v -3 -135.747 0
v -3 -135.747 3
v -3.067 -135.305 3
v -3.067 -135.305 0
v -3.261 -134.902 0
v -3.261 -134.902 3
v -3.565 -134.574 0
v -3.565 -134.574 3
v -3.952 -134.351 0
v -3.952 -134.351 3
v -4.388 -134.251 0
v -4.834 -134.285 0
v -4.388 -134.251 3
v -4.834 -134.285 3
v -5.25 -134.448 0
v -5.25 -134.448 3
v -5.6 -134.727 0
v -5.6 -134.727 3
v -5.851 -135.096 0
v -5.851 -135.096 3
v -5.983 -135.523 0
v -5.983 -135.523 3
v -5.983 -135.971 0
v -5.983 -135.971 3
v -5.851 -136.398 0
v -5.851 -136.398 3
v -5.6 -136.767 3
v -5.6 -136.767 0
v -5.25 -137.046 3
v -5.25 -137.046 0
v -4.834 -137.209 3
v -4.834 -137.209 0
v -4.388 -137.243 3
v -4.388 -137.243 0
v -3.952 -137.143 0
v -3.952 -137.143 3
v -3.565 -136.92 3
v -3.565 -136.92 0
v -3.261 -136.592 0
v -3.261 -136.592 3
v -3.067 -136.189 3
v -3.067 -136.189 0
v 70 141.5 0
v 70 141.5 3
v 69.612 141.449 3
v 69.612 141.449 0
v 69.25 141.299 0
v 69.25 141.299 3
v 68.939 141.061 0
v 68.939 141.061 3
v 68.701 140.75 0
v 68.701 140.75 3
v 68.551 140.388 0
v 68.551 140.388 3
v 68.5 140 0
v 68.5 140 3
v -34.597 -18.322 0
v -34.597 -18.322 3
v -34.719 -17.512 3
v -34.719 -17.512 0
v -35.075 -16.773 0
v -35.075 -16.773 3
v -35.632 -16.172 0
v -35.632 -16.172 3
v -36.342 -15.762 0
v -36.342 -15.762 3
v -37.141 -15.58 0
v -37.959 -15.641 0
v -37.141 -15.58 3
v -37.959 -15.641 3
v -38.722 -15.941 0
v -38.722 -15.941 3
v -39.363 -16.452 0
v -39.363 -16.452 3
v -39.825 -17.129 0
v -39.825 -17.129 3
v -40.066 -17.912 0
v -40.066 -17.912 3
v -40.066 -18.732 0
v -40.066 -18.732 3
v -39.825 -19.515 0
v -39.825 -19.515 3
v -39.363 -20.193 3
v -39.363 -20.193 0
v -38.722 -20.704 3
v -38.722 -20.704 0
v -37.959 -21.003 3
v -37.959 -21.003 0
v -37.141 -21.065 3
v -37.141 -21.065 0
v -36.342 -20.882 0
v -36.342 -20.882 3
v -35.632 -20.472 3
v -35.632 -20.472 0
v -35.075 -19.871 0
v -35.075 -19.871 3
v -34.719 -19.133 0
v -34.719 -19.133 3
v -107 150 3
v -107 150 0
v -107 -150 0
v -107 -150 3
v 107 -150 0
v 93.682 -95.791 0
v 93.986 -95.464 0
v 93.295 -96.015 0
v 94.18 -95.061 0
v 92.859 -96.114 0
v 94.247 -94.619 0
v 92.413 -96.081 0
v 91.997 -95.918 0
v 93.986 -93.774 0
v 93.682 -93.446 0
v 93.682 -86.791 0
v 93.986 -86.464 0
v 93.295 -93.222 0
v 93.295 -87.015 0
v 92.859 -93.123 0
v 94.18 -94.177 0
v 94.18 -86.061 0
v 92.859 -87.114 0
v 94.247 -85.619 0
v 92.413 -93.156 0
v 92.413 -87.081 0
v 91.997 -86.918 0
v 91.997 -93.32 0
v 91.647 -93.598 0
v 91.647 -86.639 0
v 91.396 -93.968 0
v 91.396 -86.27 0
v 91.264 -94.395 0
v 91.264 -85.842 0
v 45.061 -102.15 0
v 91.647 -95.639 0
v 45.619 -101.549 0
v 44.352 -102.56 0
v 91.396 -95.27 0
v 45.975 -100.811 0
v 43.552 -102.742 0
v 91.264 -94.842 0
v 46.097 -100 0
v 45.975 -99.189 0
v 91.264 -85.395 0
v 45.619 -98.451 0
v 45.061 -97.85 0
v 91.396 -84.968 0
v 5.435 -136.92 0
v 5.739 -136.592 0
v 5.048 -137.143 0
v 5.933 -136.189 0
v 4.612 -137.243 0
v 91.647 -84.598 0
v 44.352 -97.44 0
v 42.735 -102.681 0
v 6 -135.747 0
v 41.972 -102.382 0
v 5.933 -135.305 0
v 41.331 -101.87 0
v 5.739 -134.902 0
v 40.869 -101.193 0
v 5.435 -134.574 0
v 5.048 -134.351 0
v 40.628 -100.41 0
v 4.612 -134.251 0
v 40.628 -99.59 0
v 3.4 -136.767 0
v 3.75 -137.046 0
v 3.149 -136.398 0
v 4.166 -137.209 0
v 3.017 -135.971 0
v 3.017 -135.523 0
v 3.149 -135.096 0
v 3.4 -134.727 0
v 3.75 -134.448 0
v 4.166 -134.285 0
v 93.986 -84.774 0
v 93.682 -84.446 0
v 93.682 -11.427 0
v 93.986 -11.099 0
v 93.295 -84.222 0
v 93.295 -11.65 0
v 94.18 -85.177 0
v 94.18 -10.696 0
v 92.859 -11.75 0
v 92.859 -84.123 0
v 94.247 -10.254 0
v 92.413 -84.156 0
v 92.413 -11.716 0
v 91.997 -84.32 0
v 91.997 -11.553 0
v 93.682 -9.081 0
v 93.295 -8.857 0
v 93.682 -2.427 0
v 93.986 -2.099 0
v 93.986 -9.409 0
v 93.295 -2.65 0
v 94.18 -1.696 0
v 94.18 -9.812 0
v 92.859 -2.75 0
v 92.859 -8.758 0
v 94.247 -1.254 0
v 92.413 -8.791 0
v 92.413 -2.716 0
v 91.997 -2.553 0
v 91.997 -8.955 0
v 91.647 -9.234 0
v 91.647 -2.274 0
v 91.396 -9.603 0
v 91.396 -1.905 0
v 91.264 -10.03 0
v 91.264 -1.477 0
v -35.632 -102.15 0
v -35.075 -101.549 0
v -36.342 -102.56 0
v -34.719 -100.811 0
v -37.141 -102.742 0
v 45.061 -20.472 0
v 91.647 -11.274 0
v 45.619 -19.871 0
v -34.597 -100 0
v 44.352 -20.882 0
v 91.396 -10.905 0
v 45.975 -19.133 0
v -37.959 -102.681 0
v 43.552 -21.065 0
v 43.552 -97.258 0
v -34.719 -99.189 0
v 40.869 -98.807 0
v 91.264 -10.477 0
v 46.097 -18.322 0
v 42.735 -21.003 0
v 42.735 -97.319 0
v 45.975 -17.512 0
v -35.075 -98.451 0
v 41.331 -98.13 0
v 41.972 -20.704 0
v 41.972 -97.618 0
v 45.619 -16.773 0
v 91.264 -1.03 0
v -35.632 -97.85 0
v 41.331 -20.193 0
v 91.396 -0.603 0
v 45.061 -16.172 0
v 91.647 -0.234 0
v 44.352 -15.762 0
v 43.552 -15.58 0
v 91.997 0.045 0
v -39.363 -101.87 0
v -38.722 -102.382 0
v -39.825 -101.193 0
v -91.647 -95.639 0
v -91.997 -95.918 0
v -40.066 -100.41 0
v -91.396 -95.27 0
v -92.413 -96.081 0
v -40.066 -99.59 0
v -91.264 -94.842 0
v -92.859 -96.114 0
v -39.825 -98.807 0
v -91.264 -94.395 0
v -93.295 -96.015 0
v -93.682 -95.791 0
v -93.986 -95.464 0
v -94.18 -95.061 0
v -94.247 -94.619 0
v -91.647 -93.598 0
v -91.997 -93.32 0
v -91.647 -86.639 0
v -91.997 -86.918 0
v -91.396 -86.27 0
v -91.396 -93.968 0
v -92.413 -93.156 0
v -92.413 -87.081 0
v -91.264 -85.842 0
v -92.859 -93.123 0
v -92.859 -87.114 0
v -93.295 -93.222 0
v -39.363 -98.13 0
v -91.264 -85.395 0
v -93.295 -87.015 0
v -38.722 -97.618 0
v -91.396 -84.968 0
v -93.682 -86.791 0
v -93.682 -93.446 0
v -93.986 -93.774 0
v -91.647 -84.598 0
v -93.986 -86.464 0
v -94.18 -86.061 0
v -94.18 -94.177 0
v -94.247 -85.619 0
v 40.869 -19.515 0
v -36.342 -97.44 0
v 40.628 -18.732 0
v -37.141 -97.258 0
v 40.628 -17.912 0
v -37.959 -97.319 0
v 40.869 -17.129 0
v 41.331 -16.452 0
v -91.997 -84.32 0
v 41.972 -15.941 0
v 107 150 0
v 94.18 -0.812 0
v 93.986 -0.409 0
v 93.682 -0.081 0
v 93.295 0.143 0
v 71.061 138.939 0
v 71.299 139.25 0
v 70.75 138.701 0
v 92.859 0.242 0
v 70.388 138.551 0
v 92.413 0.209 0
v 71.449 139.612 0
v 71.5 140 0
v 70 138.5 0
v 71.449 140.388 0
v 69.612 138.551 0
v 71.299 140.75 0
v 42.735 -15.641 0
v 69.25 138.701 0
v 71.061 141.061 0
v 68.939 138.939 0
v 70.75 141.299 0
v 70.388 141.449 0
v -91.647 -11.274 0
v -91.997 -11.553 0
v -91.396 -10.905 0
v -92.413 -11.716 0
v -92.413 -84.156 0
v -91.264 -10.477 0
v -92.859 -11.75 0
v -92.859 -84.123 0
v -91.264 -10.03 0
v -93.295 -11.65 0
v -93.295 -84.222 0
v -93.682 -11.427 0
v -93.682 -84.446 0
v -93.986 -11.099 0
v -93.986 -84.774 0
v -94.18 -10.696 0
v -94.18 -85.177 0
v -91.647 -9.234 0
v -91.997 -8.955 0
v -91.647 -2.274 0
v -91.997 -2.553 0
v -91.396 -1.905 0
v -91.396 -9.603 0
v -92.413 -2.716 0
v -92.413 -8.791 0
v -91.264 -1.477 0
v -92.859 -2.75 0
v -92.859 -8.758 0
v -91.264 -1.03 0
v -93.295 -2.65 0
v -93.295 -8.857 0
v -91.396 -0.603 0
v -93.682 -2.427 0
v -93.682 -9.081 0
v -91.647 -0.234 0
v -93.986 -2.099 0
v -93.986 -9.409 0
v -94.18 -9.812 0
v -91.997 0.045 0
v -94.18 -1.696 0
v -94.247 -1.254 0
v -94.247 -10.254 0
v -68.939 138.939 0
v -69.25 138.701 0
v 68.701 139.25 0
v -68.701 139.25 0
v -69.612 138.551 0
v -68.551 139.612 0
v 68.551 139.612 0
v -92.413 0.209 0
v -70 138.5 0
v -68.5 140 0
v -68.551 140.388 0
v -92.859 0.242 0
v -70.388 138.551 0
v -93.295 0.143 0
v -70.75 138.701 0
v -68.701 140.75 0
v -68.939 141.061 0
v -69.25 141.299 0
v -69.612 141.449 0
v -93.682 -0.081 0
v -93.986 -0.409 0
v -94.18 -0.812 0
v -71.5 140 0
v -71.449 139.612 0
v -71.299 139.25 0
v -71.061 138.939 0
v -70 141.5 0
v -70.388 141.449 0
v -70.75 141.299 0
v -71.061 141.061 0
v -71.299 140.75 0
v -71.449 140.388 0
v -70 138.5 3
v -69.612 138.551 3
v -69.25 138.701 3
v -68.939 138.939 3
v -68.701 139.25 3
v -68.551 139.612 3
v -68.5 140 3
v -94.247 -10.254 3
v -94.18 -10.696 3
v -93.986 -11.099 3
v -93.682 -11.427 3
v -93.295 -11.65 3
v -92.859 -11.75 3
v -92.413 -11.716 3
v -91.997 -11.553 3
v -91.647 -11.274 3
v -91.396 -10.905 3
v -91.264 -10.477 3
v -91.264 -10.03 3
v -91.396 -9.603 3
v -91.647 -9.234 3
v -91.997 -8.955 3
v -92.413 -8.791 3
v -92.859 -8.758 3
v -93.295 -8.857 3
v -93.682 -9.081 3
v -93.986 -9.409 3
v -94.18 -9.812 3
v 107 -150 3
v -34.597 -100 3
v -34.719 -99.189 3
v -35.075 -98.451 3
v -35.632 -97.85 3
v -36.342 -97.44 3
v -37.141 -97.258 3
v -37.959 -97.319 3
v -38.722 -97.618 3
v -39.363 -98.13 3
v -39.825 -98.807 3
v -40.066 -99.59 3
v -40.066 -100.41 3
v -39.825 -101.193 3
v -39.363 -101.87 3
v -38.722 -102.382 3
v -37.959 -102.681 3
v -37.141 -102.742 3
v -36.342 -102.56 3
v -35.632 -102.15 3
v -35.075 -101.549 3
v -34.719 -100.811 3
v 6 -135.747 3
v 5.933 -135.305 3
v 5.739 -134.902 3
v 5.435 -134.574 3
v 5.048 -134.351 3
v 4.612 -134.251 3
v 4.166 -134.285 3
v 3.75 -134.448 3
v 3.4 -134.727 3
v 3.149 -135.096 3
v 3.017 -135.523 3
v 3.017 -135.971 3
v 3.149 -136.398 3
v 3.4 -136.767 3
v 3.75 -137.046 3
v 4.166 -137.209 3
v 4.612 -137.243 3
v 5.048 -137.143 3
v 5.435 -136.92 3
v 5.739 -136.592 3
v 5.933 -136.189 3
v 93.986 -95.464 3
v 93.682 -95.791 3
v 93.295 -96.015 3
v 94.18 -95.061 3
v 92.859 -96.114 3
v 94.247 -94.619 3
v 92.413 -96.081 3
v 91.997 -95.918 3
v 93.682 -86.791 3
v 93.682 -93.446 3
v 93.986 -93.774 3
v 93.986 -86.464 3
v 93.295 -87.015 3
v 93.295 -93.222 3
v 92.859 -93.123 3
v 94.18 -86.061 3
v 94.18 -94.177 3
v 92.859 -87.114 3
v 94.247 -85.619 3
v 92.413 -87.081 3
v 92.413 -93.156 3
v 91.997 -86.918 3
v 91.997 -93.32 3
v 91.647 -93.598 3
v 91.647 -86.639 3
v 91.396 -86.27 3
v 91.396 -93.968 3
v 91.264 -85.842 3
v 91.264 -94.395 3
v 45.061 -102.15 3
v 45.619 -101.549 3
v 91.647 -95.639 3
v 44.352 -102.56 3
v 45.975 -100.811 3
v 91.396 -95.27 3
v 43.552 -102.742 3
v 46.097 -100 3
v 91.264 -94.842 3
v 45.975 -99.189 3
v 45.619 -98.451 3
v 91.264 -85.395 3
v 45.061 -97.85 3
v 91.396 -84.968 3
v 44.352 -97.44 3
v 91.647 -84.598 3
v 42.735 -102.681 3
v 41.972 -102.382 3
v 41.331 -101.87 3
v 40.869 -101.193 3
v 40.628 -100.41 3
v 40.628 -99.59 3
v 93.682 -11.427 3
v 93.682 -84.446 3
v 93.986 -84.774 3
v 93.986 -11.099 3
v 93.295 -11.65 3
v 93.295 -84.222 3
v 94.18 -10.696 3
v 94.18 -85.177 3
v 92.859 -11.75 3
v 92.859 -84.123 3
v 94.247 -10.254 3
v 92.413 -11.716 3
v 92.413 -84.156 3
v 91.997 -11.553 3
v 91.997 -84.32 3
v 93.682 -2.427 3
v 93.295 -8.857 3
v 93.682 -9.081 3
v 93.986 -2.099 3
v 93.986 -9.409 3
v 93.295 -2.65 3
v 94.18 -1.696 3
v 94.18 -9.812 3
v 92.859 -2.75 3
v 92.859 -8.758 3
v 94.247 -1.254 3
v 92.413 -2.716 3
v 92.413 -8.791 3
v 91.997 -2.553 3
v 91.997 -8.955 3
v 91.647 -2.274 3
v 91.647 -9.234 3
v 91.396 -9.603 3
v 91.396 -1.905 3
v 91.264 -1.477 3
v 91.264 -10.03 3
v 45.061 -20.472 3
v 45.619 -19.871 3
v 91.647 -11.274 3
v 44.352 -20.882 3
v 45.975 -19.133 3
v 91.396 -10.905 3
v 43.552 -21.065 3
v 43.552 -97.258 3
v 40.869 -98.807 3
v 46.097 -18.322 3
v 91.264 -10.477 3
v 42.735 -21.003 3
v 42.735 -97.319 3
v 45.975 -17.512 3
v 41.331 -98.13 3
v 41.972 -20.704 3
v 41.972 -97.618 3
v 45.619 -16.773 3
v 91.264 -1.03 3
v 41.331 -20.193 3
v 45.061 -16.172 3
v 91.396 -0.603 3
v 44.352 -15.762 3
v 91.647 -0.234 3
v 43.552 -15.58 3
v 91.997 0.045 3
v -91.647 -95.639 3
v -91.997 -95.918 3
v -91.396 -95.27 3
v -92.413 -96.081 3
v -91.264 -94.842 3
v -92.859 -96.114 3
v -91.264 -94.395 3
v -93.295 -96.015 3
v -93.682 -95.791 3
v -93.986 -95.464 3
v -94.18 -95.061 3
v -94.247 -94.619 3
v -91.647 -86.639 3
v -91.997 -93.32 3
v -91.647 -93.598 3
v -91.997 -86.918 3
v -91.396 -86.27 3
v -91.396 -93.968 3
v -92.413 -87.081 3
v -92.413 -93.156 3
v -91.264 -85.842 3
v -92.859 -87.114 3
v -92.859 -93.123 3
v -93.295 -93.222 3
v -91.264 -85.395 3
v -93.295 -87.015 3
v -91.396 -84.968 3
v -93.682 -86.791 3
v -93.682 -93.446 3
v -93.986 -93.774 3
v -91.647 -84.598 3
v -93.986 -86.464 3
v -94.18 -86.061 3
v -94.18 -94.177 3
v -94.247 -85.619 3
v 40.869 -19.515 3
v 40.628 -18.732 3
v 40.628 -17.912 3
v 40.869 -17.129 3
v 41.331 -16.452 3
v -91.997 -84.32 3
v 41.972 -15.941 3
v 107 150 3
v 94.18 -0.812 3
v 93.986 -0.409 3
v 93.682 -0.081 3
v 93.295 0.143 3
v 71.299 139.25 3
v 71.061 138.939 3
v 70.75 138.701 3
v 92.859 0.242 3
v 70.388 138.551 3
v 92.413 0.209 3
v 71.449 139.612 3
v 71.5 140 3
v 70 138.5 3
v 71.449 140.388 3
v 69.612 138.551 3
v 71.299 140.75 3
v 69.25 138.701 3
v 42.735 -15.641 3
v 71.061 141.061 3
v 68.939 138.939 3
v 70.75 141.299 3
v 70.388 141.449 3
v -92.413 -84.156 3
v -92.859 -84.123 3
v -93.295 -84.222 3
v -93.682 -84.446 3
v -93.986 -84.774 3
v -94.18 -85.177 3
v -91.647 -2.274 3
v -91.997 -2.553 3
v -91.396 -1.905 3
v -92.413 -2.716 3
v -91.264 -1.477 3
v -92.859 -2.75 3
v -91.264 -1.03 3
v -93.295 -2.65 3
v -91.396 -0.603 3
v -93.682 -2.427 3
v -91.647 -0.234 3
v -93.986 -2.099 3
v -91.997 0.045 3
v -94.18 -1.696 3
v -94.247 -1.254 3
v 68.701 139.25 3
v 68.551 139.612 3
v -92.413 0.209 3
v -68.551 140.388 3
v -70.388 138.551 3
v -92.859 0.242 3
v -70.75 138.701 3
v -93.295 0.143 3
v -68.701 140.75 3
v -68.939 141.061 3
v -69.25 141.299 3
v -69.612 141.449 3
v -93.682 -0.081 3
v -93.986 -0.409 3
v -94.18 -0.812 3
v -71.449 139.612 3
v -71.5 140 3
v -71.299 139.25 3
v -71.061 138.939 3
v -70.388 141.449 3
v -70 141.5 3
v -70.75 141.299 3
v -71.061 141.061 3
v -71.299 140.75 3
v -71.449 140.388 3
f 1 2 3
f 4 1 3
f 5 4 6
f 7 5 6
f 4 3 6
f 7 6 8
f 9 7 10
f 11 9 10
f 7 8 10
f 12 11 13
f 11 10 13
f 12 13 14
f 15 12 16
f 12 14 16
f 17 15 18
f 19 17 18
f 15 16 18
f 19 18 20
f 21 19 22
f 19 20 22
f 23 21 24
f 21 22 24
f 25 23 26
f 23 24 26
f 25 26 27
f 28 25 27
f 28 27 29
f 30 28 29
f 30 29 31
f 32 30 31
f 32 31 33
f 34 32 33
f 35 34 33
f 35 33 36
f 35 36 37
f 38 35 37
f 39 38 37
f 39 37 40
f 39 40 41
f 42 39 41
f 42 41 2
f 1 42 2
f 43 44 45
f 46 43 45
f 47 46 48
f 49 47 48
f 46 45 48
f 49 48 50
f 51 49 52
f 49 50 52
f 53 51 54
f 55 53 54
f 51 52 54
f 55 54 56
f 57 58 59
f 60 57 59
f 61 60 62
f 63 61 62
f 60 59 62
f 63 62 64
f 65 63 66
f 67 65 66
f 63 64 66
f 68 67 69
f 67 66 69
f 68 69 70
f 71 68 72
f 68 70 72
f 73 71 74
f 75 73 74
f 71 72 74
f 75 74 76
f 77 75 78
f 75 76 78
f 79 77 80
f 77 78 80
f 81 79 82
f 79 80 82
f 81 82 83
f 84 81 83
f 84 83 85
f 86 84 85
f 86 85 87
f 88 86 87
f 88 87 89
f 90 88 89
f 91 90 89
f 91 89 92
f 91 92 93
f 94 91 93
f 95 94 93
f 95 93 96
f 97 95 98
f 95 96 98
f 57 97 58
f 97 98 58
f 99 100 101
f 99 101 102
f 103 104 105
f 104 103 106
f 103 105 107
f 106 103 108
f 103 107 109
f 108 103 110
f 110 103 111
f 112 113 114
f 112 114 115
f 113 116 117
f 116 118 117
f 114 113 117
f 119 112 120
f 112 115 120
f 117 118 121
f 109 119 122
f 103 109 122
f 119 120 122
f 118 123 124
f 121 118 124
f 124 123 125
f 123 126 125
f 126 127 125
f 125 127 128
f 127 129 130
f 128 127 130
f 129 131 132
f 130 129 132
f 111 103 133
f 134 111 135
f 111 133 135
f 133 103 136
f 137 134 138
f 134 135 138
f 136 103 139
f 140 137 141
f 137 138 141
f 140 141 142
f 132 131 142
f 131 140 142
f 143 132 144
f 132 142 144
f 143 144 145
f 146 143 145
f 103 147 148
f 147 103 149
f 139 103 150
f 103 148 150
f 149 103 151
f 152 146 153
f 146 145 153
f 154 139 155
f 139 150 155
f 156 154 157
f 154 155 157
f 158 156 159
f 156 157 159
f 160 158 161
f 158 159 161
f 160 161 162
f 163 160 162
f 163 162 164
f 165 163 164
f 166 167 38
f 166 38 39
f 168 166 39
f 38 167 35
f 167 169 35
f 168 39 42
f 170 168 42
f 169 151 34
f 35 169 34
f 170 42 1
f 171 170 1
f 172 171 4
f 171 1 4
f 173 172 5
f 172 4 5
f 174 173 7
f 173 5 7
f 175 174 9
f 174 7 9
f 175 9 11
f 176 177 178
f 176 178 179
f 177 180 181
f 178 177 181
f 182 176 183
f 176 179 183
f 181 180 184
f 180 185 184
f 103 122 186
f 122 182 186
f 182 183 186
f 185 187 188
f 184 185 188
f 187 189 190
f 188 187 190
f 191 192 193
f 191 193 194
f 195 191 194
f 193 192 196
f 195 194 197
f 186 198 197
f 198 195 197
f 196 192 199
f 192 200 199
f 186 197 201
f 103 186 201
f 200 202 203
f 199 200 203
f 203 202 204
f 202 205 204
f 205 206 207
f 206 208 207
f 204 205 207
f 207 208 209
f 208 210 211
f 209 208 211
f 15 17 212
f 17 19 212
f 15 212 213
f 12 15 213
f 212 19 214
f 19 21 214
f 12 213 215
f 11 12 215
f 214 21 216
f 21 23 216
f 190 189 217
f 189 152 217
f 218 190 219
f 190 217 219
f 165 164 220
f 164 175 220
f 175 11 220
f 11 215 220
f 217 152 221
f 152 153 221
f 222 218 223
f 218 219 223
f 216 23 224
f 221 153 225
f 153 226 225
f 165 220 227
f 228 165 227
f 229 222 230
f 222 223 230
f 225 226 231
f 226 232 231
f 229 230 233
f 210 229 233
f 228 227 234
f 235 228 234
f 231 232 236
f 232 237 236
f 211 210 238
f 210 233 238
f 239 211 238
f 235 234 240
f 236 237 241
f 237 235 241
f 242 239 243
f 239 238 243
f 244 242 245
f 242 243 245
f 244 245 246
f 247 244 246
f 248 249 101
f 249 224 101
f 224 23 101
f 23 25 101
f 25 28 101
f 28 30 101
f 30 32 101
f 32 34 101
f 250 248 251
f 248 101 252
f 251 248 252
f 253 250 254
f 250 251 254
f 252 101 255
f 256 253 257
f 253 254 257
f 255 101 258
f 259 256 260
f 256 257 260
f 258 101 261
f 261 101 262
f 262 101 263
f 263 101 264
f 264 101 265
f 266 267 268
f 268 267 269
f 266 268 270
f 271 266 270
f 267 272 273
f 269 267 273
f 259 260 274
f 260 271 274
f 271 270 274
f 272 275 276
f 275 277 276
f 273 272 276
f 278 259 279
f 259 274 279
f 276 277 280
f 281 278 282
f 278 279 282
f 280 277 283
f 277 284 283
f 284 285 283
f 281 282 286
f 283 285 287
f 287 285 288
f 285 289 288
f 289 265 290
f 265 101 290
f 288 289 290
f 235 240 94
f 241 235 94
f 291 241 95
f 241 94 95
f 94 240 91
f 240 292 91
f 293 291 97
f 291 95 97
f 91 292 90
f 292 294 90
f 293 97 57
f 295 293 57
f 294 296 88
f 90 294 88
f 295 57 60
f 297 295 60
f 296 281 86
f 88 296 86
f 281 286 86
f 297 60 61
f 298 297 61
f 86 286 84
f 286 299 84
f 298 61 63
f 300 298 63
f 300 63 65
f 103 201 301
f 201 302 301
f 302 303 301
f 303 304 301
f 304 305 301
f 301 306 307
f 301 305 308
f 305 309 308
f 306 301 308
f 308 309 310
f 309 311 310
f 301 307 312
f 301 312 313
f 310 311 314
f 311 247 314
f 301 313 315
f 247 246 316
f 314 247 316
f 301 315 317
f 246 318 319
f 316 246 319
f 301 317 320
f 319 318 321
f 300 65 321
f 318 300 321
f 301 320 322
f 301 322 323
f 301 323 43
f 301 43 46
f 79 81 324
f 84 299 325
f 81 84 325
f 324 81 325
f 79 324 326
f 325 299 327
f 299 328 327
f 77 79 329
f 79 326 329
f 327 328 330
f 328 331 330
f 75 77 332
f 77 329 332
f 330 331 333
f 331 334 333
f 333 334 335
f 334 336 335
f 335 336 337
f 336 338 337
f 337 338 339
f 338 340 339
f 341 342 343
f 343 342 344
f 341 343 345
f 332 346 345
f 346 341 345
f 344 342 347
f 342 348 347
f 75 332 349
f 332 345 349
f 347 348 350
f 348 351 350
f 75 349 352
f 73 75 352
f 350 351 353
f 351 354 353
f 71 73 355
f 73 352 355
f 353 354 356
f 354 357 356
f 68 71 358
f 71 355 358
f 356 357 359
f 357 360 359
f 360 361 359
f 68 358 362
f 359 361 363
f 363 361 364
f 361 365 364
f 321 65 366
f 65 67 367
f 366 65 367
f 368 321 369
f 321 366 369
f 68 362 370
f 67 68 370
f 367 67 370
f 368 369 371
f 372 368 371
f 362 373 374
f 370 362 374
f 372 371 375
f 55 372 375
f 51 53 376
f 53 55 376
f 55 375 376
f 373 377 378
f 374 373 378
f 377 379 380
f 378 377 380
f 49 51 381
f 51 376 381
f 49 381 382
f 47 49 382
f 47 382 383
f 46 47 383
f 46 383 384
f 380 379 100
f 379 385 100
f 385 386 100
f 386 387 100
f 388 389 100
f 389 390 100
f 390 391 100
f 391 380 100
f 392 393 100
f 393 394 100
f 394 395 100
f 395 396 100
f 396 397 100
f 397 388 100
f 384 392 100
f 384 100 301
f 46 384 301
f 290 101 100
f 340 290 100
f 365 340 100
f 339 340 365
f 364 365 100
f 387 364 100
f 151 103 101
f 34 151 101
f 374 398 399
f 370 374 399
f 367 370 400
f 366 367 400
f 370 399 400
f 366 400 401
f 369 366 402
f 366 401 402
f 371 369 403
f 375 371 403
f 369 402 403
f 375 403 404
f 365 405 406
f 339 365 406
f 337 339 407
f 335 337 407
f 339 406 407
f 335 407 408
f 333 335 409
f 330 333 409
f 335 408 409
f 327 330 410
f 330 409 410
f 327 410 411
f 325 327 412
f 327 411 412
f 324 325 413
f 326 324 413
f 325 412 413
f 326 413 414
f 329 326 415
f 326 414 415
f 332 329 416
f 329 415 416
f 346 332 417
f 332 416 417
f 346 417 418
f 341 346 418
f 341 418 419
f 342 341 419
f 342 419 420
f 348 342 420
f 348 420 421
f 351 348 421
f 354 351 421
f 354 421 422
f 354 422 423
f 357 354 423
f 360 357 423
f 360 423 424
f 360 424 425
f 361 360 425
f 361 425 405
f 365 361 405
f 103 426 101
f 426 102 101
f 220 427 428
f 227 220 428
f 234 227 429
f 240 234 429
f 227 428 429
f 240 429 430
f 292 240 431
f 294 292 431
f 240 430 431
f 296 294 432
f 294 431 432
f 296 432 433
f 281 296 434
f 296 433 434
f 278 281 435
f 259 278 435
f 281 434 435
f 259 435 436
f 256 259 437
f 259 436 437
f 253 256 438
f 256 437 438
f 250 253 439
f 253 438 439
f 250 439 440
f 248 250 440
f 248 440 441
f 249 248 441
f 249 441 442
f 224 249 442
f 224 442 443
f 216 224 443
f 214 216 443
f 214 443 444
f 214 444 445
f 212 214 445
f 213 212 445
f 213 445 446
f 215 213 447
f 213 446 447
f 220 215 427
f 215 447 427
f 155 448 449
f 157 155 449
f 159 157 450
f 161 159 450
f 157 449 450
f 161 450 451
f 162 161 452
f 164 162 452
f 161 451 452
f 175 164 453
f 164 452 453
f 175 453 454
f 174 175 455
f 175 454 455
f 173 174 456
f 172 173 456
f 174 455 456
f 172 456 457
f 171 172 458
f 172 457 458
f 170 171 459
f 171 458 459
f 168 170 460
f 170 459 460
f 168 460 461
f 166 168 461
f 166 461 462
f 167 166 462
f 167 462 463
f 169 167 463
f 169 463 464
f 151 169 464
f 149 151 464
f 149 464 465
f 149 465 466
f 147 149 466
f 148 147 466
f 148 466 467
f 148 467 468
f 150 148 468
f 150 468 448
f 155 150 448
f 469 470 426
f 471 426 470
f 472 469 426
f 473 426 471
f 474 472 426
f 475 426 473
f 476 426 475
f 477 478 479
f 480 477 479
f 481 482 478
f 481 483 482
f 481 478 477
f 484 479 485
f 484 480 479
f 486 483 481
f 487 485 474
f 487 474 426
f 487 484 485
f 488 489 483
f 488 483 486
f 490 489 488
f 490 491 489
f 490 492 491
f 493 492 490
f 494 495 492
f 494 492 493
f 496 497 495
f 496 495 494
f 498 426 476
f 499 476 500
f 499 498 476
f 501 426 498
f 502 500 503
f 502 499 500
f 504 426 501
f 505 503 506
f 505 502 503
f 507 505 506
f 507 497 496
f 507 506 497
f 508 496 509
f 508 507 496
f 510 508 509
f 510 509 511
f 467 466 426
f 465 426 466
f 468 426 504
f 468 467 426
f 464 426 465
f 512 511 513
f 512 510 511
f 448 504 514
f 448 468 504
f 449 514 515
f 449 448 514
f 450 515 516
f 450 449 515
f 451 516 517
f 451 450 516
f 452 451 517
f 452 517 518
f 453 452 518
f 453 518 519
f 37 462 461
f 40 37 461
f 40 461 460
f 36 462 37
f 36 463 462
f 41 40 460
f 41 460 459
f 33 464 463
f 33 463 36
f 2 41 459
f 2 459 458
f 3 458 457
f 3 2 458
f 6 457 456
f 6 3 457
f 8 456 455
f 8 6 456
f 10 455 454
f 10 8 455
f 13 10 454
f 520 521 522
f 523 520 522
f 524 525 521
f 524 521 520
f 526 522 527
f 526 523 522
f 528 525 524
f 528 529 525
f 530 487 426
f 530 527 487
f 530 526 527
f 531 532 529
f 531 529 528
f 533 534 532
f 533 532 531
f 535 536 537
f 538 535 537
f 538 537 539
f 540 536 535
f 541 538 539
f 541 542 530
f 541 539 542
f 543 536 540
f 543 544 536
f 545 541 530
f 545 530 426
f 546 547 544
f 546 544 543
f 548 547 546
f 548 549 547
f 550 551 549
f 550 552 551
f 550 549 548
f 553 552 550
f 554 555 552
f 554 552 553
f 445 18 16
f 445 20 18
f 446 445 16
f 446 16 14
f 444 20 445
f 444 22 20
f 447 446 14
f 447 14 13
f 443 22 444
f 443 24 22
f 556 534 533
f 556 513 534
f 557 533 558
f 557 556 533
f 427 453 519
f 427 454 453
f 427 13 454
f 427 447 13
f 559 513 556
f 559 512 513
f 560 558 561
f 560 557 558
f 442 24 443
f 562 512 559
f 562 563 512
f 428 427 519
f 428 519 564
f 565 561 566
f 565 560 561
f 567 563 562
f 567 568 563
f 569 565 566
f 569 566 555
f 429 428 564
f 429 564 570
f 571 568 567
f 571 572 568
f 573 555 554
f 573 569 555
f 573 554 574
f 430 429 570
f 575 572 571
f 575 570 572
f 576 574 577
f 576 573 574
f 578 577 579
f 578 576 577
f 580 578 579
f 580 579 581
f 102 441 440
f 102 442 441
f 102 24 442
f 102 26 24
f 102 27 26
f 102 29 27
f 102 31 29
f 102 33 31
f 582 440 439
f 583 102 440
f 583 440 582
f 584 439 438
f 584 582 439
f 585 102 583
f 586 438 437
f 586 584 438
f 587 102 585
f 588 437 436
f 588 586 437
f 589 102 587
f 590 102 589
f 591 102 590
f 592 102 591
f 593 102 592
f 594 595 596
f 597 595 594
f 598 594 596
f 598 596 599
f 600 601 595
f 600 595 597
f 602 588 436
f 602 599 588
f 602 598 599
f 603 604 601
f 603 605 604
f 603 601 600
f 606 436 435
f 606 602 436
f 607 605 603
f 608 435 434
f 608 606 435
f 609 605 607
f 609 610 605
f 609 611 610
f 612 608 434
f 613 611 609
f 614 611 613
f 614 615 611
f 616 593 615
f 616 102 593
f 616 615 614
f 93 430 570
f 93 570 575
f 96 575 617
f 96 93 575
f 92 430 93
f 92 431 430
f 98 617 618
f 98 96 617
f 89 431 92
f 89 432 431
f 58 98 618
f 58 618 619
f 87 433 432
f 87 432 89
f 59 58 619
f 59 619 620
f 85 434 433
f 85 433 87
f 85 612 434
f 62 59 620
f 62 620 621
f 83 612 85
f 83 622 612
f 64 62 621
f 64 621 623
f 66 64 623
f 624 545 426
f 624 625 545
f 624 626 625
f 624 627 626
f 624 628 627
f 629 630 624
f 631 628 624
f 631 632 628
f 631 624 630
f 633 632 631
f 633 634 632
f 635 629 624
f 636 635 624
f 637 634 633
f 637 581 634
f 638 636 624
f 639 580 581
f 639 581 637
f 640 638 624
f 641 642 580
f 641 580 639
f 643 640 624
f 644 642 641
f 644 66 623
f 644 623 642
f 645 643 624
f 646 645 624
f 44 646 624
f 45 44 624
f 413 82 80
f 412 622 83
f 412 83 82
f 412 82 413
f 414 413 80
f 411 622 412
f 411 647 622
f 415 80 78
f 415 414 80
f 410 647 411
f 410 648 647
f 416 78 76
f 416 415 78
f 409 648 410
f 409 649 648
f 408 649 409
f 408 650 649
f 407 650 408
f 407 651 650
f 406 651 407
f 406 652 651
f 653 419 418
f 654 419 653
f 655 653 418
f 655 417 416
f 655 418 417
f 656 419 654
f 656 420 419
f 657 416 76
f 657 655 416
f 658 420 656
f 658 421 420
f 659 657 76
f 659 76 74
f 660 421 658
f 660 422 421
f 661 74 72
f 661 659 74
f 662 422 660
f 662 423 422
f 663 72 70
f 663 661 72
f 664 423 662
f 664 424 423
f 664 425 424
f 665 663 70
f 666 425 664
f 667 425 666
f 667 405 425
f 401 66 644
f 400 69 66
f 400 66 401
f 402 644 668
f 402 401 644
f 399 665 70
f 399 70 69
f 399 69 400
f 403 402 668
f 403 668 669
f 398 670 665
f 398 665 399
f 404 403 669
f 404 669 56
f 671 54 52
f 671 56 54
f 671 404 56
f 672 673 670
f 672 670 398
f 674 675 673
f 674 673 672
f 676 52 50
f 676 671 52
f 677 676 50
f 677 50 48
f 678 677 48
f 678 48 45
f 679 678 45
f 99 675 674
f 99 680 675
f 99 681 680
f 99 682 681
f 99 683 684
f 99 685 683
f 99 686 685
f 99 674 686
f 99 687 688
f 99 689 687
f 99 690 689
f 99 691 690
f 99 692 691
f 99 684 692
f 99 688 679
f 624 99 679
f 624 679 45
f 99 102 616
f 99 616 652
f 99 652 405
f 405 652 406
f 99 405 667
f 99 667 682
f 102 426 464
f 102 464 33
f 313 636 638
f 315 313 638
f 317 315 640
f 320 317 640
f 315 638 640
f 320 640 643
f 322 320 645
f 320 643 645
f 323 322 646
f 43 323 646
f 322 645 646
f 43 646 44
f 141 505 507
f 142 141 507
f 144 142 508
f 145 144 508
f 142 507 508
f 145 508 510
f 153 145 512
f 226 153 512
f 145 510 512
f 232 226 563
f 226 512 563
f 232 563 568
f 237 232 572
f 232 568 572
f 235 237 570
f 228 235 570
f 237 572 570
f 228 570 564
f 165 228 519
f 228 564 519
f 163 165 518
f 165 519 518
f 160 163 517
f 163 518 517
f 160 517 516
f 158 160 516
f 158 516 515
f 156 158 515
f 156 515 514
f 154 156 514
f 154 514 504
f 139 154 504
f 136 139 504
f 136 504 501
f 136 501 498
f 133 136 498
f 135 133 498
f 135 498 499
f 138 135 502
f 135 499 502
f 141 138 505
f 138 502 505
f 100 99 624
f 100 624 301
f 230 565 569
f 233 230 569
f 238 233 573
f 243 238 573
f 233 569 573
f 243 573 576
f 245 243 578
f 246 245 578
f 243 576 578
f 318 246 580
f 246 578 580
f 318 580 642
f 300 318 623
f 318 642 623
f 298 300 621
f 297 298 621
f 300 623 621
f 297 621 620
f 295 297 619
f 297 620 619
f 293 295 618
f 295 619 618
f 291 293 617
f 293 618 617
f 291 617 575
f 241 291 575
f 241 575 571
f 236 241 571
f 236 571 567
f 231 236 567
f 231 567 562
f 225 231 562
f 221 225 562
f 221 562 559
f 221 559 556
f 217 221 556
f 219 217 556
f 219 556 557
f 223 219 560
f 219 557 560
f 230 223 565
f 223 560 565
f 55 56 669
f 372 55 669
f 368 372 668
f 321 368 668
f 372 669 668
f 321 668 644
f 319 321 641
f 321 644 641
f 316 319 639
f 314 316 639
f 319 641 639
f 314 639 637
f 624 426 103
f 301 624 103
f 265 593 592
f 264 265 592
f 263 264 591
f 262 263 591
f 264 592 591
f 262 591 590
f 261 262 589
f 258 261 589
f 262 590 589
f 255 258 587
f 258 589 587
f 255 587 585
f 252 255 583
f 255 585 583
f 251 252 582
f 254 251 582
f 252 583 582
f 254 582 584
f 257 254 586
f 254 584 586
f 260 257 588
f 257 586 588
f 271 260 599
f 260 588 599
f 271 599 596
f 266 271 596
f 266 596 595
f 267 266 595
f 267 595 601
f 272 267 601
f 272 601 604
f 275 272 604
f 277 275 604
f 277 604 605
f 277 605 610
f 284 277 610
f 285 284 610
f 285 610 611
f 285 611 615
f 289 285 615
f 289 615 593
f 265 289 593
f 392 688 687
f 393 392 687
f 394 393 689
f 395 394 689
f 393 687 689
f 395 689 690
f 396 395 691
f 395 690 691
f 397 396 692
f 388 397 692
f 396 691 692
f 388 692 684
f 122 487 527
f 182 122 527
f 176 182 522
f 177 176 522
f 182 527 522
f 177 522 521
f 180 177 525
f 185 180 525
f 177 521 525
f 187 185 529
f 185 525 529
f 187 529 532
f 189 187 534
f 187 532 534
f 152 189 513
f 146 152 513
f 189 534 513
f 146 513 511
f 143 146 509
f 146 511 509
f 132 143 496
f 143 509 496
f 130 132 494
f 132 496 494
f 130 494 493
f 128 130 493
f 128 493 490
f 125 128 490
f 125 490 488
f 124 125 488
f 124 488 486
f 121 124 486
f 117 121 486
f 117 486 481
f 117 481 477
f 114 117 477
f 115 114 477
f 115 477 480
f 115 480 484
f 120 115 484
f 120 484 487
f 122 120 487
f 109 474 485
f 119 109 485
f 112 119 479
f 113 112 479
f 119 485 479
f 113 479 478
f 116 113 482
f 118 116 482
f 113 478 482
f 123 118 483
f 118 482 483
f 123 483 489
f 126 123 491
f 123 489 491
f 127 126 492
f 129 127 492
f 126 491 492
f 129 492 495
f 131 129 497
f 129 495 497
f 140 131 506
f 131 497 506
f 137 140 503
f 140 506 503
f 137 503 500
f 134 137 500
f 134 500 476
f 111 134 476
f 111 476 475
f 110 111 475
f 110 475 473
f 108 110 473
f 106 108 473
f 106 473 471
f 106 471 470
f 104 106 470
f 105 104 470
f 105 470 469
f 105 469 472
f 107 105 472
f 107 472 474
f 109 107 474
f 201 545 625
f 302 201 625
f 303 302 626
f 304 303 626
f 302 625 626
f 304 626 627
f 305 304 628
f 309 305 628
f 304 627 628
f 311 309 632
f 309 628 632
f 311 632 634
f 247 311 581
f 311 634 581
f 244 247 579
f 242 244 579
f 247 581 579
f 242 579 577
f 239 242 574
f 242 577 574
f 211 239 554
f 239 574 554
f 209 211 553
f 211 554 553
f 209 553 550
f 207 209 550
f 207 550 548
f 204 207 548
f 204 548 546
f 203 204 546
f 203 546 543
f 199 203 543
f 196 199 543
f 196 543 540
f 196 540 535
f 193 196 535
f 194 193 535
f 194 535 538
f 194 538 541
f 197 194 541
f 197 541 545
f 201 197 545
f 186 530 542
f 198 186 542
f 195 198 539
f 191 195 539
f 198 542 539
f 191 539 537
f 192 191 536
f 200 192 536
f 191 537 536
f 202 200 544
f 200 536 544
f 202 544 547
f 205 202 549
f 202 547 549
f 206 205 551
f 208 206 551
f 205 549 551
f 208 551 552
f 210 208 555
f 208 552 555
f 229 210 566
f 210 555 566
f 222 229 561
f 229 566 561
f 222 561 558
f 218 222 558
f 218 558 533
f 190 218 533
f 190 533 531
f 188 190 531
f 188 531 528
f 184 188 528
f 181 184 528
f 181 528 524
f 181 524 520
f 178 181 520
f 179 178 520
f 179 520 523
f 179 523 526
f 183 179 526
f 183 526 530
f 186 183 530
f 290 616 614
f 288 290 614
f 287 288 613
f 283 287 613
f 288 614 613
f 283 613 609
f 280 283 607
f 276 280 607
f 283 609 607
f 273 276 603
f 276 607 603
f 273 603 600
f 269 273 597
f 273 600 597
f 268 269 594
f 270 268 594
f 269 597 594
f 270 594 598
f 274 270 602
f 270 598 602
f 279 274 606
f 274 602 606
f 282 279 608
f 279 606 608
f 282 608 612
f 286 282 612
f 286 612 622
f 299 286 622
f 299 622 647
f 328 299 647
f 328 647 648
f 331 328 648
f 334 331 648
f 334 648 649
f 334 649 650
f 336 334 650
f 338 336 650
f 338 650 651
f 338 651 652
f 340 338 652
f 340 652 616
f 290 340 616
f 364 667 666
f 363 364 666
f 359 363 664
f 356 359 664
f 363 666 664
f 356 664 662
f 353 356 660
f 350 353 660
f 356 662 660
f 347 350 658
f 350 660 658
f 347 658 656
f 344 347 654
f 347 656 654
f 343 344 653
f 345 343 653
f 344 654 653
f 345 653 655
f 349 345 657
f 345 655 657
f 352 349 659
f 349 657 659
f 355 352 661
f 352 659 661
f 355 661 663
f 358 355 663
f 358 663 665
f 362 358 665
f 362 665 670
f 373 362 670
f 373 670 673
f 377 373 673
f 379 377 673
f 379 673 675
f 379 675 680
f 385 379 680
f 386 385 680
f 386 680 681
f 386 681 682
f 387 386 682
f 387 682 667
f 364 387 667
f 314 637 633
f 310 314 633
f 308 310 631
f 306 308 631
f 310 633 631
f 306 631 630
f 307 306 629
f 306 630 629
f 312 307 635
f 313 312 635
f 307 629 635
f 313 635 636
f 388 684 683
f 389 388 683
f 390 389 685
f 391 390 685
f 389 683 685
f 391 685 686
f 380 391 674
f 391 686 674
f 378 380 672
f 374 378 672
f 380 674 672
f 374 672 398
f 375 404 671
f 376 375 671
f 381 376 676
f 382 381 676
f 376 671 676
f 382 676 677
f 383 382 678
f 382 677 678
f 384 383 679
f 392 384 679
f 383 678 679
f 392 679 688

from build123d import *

# Parameters (mm, degrees)
SKETCH1_W           = 204
SKETCH1_H           = 300
BOSS_EXTRUDE1_DEPTH = 3
SKETCH2_R           = 2.75
CUT_EXTRUDE1_DEPTH  = 3
SKETCH4_W           = 3
SKETCH4_H           = 300
BOSS_EXTRUDE2_DEPTH = 5
SKETCH5_W           = 3
SKETCH5_H           = 300
BOSS_EXTRUDE3_DEPTH = 5
SKETCH3_R           = 1.5
CUT_EXTRUDE2_DEPTH  = 10
SKETCH9_R           = 1.5
CUT_EXTRUDE3_DEPTH  = 10
CUT_EXTRUDE4_DEPTH  = 10


with BuildPart() as part:
    # Sketch1 → Boss-Extrude1 (new body)
    with BuildSketch(Plane.XY):
        Rectangle(SKETCH1_W, SKETCH1_H)
    extrude(amount=BOSS_EXTRUDE1_DEPTH)

    # Sketch2 → Cut-Extrude1 (cut)
    with BuildSketch(Plane.XY.offset(3)):
        with Locations((-37.346869525, -18.322190961)):
            Circle(SKETCH2_R)
        with Locations((43.346869525, -18.322190961)):
            Circle(SKETCH2_R)
        with Locations((43.346869525, -100)):
            Circle(SKETCH2_R)
        with Locations((-37.346869525, -100)):
            Circle(SKETCH2_R)
    extrude(amount=-CUT_EXTRUDE1_DEPTH, mode=Mode.SUBTRACT)

    # Sketch4 → Boss-Extrude2 (add)
    with BuildSketch(Plane.ZY.offset(102)):
        with Locations((1.5, 0)):
            Rectangle(SKETCH4_W, SKETCH4_H)
    extrude(amount=BOSS_EXTRUDE2_DEPTH)

    # Sketch5 → Boss-Extrude3 (add)
    with BuildSketch(Plane(origin=(102, 0, 0), x_dir=(0, 0, -1), z_dir=(1, 0, 0))):
        with Locations((-1.5, 0)):
            Rectangle(SKETCH5_W, SKETCH5_H)
    extrude(amount=BOSS_EXTRUDE3_DEPTH)

    # Sketch3 → Cut-Extrude2 (cut)
    with BuildSketch(Plane.XY.offset(3)):
        with Locations((92.747048823, -10.253799858)):
            Circle(SKETCH3_R)
        with Locations((92.747048823, -1.253799858)):
            Circle(SKETCH3_R)
        with Locations((92.747048823, -94.618676634)):
            Circle(SKETCH3_R)
        with Locations((92.747048823, -85.618676634)):
            Circle(SKETCH3_R)
        with Locations(Location((-92.747048823, -85.618676634, 0), (0, 0, 180))):
            Circle(SKETCH3_R)
        with Locations(Location((-92.747048823, -94.618676634, 0), (0, 0, 180))):
            Circle(SKETCH3_R)
        with Locations(Location((-92.747048823, -1.253799858, 0), (0, 0, 180))):
            Circle(SKETCH3_R)
        with Locations(Location((-92.747048823, -10.253799858, 0), (0, 0, 180))):
            Circle(SKETCH3_R)
    extrude(amount=-CUT_EXTRUDE2_DEPTH, mode=Mode.SUBTRACT)

    # Sketch9 → Cut-Extrude3 (cut)
    with BuildSketch(Plane.XY.offset(3)):
        with Locations((-4.5, -135.747048823)):
            Circle(SKETCH9_R)
        with Locations((4.5, -135.747048823)):
            Circle(SKETCH9_R)
    extrude(amount=-CUT_EXTRUDE3_DEPTH, mode=Mode.SUBTRACT)

    # Sketch10 → Cut-Extrude4 (cut)
    with BuildSketch(Plane.XY.offset(3)):
        with BuildLine():
            ThreePointArc((-70, 138.5), (-68.939339828, 138.939339828), (-68.5, 140))
            Line((-68.5, 140), (-70, 140))
            Line((-70, 140), (-70, 138.5))
        make_face()
        with BuildLine():
            Line((-70, 140), (-68.5, 140))
            ThreePointArc((-68.5, 140), (-68.939339828, 141.060660172), (-70, 141.5))
            Line((-70, 141.5), (-70, 140))
        make_face()
        with BuildLine():
            ThreePointArc((-70, 141.5), (-71.060660172, 141.060660172), (-71.5, 140))
            Line((-71.5, 140), (-70, 140))
            Line((-70, 140), (-70, 141.5))
        make_face()
        with BuildLine():
            Line((-70, 140), (-71.5, 140))
            ThreePointArc((-71.5, 140), (-71.060660172, 138.939339828), (-70, 138.5))
            Line((-70, 138.5), (-70, 140))
        make_face()
        with BuildLine():
            ThreePointArc((70, 138.5), (71.060660172, 138.939339828), (71.5, 140))
            Line((71.5, 140), (70, 140))
            Line((70, 140), (70, 138.5))
        make_face()
        with BuildLine():
            Line((70, 140), (71.5, 140))
            ThreePointArc((71.5, 140), (71.060660172, 141.060660172), (70, 141.5))
            Line((70, 141.5), (70, 140))
        make_face()
        with BuildLine():
            Line((70, 138.5), (70, 140))
            Line((70, 140), (68.5, 140))
            ThreePointArc((68.5, 140), (68.939339828, 138.939339828), (70, 138.5))
        make_face()
        with BuildLine():
            Line((68.5, 140), (70, 140))
            Line((70, 140), (70, 141.5))
            ThreePointArc((70, 141.5), (68.939339828, 141.060660172), (68.5, 140))
        make_face()
    extrude(amount=-CUT_EXTRUDE4_DEPTH, mode=Mode.SUBTRACT)


solid = part.part
